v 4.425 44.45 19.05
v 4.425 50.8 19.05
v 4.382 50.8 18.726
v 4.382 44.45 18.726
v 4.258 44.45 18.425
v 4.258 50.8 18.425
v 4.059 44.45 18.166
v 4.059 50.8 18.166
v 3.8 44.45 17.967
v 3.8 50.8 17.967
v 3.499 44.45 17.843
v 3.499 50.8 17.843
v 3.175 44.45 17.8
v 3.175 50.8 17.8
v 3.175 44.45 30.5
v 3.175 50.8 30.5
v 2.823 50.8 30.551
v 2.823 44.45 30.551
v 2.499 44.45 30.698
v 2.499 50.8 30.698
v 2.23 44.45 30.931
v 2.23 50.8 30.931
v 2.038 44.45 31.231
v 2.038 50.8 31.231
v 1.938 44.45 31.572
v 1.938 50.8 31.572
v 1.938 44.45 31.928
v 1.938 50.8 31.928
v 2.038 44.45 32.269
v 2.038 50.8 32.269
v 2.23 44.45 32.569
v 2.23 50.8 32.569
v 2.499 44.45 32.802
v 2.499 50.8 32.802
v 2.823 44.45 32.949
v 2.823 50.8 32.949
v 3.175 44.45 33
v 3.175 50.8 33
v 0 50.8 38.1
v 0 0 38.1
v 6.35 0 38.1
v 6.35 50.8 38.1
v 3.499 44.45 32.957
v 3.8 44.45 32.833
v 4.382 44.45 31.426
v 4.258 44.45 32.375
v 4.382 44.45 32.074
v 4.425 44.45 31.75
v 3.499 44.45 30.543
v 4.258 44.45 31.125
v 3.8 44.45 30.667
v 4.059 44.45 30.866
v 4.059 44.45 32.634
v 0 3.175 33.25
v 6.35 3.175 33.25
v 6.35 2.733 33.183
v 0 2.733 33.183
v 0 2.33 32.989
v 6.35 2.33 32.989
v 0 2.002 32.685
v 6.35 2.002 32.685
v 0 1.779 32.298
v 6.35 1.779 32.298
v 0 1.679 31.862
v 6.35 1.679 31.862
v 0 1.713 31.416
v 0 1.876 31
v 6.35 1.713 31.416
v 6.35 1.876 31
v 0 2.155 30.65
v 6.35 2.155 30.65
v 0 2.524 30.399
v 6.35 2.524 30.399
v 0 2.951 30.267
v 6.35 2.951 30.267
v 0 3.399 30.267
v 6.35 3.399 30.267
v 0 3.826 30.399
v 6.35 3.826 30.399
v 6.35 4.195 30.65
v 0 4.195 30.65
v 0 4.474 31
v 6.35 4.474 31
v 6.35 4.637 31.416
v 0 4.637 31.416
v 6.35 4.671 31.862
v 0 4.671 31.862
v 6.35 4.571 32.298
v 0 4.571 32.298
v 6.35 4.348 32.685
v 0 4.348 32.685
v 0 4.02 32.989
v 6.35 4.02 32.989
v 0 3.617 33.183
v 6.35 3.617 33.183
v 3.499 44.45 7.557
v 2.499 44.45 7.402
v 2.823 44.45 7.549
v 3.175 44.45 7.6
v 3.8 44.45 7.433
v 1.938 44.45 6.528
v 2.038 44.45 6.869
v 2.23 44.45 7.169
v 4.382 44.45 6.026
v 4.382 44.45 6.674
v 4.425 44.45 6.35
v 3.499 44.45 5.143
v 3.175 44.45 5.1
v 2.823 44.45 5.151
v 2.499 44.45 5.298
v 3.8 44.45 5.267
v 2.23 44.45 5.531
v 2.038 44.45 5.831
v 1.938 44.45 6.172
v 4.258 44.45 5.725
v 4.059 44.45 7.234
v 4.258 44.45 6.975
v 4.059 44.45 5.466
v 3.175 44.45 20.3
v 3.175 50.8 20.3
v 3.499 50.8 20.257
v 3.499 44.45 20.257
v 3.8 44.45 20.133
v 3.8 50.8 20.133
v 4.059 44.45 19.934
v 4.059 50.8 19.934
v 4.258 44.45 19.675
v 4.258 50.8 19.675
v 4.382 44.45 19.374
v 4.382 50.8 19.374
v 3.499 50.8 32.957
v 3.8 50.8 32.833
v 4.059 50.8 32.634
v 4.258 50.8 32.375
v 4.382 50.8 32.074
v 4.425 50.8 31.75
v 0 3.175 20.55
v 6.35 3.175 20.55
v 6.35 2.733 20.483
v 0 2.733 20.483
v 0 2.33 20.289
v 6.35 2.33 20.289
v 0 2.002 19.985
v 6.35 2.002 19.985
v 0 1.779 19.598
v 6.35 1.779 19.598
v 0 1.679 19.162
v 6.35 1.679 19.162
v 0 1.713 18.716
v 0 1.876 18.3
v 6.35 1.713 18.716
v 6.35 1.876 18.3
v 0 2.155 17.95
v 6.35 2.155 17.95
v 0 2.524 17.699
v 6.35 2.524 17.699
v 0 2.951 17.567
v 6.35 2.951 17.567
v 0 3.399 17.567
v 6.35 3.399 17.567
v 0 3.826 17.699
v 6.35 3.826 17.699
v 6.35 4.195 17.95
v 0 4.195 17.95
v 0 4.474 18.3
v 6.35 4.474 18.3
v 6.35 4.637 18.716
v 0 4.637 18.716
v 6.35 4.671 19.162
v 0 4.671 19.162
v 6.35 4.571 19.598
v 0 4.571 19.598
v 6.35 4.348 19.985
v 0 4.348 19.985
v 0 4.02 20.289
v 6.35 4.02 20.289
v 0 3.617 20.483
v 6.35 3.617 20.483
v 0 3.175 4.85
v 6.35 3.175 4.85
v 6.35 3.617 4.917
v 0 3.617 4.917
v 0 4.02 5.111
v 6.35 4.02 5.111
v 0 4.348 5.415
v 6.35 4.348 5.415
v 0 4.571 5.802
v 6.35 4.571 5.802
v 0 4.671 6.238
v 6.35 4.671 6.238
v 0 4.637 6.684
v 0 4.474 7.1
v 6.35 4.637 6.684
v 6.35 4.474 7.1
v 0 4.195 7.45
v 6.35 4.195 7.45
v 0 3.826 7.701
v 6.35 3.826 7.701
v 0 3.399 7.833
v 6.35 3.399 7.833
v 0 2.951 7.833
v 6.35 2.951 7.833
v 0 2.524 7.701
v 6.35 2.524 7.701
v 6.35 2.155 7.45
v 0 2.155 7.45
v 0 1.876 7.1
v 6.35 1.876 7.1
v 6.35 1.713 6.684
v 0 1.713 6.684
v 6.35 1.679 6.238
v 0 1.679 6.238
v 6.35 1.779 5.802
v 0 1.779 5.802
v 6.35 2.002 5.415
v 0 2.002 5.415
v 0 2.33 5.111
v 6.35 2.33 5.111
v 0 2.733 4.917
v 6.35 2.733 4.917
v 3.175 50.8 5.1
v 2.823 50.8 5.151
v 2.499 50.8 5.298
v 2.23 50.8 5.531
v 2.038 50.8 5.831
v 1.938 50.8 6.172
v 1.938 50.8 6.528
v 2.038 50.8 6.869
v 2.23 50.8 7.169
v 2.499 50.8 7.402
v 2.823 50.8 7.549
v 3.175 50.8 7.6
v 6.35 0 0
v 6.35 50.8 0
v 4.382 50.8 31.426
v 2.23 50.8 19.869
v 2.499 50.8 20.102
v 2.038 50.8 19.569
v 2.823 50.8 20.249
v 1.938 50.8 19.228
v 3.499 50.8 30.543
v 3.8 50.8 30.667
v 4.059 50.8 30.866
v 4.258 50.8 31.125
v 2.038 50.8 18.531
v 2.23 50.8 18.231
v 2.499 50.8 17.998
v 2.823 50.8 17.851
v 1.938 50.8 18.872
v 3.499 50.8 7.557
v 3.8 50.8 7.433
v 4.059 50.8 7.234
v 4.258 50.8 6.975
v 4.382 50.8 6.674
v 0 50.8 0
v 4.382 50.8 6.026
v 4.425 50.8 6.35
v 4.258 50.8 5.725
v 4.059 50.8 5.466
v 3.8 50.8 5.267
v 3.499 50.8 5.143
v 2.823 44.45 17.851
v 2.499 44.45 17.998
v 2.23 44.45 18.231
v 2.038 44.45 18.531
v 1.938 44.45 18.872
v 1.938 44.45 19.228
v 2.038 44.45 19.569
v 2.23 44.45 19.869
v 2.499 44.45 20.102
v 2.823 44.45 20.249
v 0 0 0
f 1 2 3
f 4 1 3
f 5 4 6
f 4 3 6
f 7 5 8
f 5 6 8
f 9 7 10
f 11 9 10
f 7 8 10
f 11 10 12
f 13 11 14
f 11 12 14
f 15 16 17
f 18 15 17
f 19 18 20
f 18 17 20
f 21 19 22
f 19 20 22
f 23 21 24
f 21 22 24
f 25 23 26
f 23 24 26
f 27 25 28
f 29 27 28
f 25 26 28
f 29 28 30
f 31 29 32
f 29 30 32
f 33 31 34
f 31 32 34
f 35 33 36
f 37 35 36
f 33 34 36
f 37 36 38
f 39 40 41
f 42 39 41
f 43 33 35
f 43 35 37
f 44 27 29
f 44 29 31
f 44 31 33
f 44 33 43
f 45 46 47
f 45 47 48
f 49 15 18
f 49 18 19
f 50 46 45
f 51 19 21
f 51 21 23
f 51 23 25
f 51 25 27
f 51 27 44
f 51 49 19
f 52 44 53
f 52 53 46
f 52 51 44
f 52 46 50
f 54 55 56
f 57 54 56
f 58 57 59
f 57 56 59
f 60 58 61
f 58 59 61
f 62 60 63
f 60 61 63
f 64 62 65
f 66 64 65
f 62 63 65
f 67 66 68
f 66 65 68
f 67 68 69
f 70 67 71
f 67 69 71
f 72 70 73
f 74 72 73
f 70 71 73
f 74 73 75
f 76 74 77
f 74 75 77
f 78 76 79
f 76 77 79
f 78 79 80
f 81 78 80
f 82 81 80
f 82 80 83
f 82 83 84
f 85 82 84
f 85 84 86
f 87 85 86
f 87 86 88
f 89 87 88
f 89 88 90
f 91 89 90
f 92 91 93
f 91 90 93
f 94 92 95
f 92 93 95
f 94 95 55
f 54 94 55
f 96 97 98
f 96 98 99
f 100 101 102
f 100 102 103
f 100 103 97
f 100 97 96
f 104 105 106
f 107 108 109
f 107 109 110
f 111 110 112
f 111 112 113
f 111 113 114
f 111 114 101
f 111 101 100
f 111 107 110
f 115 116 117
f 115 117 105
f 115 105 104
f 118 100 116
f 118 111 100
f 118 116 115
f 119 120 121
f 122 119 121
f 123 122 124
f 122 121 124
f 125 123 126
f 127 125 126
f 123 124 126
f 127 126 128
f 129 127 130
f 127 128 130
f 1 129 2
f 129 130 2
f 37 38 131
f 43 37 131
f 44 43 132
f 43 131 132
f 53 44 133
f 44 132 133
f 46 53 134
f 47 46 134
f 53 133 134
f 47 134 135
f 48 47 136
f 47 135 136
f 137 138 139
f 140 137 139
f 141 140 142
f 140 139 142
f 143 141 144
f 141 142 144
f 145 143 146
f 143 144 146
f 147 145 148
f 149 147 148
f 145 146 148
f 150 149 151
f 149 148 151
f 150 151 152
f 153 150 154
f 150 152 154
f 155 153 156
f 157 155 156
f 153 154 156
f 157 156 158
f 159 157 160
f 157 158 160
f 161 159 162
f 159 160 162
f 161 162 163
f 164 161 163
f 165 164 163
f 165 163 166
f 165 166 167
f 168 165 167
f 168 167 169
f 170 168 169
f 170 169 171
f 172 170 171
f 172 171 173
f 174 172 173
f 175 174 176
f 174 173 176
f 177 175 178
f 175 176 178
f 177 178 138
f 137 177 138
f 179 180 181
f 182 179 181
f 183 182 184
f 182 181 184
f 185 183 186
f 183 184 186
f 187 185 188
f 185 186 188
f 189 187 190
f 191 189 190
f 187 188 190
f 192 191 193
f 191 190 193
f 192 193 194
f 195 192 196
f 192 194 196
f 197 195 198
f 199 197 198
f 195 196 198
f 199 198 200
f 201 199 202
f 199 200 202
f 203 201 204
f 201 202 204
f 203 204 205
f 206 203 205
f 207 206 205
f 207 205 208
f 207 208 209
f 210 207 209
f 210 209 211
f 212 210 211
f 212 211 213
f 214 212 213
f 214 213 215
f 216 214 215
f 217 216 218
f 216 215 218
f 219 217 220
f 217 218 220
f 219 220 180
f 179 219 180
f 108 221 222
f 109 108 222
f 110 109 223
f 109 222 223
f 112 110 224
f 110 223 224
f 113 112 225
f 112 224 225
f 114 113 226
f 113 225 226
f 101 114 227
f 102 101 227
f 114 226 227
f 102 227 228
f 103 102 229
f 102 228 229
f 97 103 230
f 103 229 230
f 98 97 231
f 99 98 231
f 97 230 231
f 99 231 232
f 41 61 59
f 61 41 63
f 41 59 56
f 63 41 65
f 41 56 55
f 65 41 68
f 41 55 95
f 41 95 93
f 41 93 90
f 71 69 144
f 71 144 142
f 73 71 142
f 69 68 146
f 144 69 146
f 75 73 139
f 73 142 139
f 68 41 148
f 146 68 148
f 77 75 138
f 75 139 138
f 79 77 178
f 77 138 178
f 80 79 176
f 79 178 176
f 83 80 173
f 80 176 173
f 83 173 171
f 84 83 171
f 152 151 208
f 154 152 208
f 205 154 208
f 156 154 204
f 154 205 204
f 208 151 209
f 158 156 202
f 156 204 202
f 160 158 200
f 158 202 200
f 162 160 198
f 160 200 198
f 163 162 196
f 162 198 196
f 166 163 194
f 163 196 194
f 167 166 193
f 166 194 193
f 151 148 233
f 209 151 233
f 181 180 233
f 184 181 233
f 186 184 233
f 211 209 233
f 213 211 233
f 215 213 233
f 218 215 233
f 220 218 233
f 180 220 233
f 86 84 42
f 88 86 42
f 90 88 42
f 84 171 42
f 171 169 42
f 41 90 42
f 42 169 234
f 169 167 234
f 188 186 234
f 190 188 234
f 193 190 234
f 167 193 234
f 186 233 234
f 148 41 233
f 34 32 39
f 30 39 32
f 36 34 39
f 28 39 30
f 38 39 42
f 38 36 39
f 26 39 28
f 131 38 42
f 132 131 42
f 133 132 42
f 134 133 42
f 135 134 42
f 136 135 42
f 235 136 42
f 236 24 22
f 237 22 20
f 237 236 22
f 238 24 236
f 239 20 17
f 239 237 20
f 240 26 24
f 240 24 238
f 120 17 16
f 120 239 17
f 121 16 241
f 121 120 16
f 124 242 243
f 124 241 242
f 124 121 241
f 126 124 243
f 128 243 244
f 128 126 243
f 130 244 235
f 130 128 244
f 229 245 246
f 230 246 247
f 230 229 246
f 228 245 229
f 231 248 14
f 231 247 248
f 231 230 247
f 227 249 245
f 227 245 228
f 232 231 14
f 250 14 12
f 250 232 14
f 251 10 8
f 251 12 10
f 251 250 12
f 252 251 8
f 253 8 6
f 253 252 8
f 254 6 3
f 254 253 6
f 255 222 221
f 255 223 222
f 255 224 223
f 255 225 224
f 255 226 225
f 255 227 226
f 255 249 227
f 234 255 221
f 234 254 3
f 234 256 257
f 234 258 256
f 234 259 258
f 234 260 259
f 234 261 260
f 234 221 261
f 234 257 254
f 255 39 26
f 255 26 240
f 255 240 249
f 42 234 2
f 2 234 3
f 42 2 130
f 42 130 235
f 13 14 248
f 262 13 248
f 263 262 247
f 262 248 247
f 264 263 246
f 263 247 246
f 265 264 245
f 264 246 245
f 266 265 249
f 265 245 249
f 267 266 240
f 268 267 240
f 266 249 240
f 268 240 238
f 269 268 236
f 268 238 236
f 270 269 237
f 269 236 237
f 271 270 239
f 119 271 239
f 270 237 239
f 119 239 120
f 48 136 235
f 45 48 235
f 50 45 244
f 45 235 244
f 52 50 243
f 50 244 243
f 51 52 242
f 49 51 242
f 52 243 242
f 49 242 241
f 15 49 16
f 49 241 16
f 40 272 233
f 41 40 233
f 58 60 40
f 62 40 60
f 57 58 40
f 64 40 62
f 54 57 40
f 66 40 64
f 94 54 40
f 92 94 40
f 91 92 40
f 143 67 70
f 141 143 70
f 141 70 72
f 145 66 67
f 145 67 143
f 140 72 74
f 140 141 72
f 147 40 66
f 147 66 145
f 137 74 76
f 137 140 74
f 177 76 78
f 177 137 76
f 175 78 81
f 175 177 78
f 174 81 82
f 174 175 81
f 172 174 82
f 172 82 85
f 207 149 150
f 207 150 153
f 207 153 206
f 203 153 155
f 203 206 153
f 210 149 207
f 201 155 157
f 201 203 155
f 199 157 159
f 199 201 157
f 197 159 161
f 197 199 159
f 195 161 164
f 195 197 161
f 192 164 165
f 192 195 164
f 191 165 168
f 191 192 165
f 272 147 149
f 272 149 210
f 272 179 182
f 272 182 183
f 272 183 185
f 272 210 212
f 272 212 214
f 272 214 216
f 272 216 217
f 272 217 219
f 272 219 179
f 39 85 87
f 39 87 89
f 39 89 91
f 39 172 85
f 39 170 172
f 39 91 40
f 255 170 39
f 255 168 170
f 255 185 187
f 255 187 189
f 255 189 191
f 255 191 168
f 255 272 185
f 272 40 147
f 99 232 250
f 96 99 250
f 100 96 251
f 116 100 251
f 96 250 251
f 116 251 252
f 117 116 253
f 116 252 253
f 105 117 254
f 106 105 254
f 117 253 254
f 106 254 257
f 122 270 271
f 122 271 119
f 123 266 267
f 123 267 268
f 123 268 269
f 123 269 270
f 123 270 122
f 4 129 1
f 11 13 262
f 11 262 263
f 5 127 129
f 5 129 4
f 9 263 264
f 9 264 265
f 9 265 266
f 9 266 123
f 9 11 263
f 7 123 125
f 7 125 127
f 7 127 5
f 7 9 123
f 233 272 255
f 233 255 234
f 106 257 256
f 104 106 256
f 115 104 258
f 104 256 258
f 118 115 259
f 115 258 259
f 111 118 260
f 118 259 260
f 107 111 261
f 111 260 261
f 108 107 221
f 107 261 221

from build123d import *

# Parameters (mm, degrees)
SKETCH1_W           = 6.35
SKETCH1_H           = 50.8
BOSS_EXTRUDE1_DEPTH = 38.1
CUT_EXTRUDE1_DEPTH  = 6.35
CUT_EXTRUDE2_DEPTH  = 6.35


with BuildPart() as part:
    # Sketch1 → Boss-Extrude1 (new body)
    with BuildSketch(Plane.XY):
        with Locations((3.175, 25.4)):
            Rectangle(SKETCH1_W, SKETCH1_H)
    extrude(amount=BOSS_EXTRUDE1_DEPTH)

    # Sketch2 → Cut-Extrude1 (cut)
    with BuildSketch(Plane(origin=(6.35, 0, 0), x_dir=(0, 0, -1), z_dir=(1, 0, 0))):
        with BuildLine():
            ThreePointArc((-7.85, 3.175), (-6.35, 1.675), (-4.85, 3.175))
            Line((-4.85, 3.175), (-6.35, 3.175))
            Line((-6.35, 3.175), (-7.85, 3.175))
        make_face()
        with BuildLine():
            Line((-6.35, 3.175), (-4.85, 3.175))
            ThreePointArc((-4.85, 3.175), (-6.35, 4.675), (-7.85, 3.175))
            Line((-7.85, 3.175), (-6.35, 3.175))
        make_face()
        with BuildLine():
            ThreePointArc((-17.55, 3.175), (-19.05, 4.675), (-20.55, 3.175))
            Line((-20.55, 3.175), (-17.55, 3.175))
        make_face()
        with BuildLine():
            Line((-17.55, 3.175), (-20.55, 3.175))
            ThreePointArc((-20.55, 3.175), (-19.05, 1.675), (-17.55, 3.175))
        make_face()
        with BuildLine():
            ThreePointArc((-30.25, 3.175), (-31.75, 4.675), (-33.25, 3.175))
            Line((-33.25, 3.175), (-31.75, 3.175))
            Line((-31.75, 3.175), (-30.25, 3.175))
        make_face()
        with BuildLine():
            Line((-31.75, 3.175), (-33.25, 3.175))
            ThreePointArc((-33.25, 3.175), (-31.75, 1.675), (-30.25, 3.175))
            Line((-30.25, 3.175), (-31.75, 3.175))
        make_face()
    extrude(amount=-CUT_EXTRUDE1_DEPTH, mode=Mode.SUBTRACT)

    # Sketch3 → Cut-Extrude2 (cut)
    with BuildSketch(Plane(origin=(0, 50.8, 0), x_dir=(1, 0, 0), z_dir=(0, 1, 0))):
        with BuildLine():
            ThreePointArc((4.425, -6.35), (4.058883476, -5.466116524), (3.175, -5.1))
            Line((3.175, -5.1), (3.175, -6.35))
            Line((3.175, -6.35), (3.175, -7.6))
            ThreePointArc((3.175, -7.6), (4.058883476, -7.233883476), (4.425, -6.35))
        make_face()
        with BuildLine():
            Line((3.175, -6.35), (3.175, -5.1))
            ThreePointArc((3.175, -5.1), (1.925, -6.35), (3.175, -7.6))
            Line((3.175, -7.6), (3.175, -6.35))
        make_face()
        with BuildLine():
            ThreePointArc((4.425, -19.05), (4.058883476, -18.166116524), (3.175, -17.8))
            Line((3.175, -17.8), (3.175, -20.3))
            ThreePointArc((3.175, -20.3), (4.058883476, -19.933883476), (4.425, -19.05))
        make_face()
        with BuildLine():
            Line((3.175, -20.3), (3.175, -17.8))
            ThreePointArc((3.175, -17.8), (1.925, -19.05), (3.175, -20.3))
        make_face()
        with BuildLine():
            ThreePointArc((3.175, -30.5), (1.925, -31.75), (3.175, -33))
            Line((3.175, -33), (3.175, -31.75))
            Line((3.175, -31.75), (3.175, -30.5))
        make_face()
        with BuildLine():
            Line((3.175, -31.75), (3.175, -33))
            ThreePointArc((3.175, -33), (4.058883476, -32.633883476), (4.425, -31.75))
            ThreePointArc((4.425, -31.75), (4.058883476, -30.866116524), (3.175, -30.5))
            Line((3.175, -30.5), (3.175, -31.75))
        make_face()
    extrude(amount=-CUT_EXTRUDE2_DEPTH, mode=Mode.SUBTRACT)


solid = part.part
